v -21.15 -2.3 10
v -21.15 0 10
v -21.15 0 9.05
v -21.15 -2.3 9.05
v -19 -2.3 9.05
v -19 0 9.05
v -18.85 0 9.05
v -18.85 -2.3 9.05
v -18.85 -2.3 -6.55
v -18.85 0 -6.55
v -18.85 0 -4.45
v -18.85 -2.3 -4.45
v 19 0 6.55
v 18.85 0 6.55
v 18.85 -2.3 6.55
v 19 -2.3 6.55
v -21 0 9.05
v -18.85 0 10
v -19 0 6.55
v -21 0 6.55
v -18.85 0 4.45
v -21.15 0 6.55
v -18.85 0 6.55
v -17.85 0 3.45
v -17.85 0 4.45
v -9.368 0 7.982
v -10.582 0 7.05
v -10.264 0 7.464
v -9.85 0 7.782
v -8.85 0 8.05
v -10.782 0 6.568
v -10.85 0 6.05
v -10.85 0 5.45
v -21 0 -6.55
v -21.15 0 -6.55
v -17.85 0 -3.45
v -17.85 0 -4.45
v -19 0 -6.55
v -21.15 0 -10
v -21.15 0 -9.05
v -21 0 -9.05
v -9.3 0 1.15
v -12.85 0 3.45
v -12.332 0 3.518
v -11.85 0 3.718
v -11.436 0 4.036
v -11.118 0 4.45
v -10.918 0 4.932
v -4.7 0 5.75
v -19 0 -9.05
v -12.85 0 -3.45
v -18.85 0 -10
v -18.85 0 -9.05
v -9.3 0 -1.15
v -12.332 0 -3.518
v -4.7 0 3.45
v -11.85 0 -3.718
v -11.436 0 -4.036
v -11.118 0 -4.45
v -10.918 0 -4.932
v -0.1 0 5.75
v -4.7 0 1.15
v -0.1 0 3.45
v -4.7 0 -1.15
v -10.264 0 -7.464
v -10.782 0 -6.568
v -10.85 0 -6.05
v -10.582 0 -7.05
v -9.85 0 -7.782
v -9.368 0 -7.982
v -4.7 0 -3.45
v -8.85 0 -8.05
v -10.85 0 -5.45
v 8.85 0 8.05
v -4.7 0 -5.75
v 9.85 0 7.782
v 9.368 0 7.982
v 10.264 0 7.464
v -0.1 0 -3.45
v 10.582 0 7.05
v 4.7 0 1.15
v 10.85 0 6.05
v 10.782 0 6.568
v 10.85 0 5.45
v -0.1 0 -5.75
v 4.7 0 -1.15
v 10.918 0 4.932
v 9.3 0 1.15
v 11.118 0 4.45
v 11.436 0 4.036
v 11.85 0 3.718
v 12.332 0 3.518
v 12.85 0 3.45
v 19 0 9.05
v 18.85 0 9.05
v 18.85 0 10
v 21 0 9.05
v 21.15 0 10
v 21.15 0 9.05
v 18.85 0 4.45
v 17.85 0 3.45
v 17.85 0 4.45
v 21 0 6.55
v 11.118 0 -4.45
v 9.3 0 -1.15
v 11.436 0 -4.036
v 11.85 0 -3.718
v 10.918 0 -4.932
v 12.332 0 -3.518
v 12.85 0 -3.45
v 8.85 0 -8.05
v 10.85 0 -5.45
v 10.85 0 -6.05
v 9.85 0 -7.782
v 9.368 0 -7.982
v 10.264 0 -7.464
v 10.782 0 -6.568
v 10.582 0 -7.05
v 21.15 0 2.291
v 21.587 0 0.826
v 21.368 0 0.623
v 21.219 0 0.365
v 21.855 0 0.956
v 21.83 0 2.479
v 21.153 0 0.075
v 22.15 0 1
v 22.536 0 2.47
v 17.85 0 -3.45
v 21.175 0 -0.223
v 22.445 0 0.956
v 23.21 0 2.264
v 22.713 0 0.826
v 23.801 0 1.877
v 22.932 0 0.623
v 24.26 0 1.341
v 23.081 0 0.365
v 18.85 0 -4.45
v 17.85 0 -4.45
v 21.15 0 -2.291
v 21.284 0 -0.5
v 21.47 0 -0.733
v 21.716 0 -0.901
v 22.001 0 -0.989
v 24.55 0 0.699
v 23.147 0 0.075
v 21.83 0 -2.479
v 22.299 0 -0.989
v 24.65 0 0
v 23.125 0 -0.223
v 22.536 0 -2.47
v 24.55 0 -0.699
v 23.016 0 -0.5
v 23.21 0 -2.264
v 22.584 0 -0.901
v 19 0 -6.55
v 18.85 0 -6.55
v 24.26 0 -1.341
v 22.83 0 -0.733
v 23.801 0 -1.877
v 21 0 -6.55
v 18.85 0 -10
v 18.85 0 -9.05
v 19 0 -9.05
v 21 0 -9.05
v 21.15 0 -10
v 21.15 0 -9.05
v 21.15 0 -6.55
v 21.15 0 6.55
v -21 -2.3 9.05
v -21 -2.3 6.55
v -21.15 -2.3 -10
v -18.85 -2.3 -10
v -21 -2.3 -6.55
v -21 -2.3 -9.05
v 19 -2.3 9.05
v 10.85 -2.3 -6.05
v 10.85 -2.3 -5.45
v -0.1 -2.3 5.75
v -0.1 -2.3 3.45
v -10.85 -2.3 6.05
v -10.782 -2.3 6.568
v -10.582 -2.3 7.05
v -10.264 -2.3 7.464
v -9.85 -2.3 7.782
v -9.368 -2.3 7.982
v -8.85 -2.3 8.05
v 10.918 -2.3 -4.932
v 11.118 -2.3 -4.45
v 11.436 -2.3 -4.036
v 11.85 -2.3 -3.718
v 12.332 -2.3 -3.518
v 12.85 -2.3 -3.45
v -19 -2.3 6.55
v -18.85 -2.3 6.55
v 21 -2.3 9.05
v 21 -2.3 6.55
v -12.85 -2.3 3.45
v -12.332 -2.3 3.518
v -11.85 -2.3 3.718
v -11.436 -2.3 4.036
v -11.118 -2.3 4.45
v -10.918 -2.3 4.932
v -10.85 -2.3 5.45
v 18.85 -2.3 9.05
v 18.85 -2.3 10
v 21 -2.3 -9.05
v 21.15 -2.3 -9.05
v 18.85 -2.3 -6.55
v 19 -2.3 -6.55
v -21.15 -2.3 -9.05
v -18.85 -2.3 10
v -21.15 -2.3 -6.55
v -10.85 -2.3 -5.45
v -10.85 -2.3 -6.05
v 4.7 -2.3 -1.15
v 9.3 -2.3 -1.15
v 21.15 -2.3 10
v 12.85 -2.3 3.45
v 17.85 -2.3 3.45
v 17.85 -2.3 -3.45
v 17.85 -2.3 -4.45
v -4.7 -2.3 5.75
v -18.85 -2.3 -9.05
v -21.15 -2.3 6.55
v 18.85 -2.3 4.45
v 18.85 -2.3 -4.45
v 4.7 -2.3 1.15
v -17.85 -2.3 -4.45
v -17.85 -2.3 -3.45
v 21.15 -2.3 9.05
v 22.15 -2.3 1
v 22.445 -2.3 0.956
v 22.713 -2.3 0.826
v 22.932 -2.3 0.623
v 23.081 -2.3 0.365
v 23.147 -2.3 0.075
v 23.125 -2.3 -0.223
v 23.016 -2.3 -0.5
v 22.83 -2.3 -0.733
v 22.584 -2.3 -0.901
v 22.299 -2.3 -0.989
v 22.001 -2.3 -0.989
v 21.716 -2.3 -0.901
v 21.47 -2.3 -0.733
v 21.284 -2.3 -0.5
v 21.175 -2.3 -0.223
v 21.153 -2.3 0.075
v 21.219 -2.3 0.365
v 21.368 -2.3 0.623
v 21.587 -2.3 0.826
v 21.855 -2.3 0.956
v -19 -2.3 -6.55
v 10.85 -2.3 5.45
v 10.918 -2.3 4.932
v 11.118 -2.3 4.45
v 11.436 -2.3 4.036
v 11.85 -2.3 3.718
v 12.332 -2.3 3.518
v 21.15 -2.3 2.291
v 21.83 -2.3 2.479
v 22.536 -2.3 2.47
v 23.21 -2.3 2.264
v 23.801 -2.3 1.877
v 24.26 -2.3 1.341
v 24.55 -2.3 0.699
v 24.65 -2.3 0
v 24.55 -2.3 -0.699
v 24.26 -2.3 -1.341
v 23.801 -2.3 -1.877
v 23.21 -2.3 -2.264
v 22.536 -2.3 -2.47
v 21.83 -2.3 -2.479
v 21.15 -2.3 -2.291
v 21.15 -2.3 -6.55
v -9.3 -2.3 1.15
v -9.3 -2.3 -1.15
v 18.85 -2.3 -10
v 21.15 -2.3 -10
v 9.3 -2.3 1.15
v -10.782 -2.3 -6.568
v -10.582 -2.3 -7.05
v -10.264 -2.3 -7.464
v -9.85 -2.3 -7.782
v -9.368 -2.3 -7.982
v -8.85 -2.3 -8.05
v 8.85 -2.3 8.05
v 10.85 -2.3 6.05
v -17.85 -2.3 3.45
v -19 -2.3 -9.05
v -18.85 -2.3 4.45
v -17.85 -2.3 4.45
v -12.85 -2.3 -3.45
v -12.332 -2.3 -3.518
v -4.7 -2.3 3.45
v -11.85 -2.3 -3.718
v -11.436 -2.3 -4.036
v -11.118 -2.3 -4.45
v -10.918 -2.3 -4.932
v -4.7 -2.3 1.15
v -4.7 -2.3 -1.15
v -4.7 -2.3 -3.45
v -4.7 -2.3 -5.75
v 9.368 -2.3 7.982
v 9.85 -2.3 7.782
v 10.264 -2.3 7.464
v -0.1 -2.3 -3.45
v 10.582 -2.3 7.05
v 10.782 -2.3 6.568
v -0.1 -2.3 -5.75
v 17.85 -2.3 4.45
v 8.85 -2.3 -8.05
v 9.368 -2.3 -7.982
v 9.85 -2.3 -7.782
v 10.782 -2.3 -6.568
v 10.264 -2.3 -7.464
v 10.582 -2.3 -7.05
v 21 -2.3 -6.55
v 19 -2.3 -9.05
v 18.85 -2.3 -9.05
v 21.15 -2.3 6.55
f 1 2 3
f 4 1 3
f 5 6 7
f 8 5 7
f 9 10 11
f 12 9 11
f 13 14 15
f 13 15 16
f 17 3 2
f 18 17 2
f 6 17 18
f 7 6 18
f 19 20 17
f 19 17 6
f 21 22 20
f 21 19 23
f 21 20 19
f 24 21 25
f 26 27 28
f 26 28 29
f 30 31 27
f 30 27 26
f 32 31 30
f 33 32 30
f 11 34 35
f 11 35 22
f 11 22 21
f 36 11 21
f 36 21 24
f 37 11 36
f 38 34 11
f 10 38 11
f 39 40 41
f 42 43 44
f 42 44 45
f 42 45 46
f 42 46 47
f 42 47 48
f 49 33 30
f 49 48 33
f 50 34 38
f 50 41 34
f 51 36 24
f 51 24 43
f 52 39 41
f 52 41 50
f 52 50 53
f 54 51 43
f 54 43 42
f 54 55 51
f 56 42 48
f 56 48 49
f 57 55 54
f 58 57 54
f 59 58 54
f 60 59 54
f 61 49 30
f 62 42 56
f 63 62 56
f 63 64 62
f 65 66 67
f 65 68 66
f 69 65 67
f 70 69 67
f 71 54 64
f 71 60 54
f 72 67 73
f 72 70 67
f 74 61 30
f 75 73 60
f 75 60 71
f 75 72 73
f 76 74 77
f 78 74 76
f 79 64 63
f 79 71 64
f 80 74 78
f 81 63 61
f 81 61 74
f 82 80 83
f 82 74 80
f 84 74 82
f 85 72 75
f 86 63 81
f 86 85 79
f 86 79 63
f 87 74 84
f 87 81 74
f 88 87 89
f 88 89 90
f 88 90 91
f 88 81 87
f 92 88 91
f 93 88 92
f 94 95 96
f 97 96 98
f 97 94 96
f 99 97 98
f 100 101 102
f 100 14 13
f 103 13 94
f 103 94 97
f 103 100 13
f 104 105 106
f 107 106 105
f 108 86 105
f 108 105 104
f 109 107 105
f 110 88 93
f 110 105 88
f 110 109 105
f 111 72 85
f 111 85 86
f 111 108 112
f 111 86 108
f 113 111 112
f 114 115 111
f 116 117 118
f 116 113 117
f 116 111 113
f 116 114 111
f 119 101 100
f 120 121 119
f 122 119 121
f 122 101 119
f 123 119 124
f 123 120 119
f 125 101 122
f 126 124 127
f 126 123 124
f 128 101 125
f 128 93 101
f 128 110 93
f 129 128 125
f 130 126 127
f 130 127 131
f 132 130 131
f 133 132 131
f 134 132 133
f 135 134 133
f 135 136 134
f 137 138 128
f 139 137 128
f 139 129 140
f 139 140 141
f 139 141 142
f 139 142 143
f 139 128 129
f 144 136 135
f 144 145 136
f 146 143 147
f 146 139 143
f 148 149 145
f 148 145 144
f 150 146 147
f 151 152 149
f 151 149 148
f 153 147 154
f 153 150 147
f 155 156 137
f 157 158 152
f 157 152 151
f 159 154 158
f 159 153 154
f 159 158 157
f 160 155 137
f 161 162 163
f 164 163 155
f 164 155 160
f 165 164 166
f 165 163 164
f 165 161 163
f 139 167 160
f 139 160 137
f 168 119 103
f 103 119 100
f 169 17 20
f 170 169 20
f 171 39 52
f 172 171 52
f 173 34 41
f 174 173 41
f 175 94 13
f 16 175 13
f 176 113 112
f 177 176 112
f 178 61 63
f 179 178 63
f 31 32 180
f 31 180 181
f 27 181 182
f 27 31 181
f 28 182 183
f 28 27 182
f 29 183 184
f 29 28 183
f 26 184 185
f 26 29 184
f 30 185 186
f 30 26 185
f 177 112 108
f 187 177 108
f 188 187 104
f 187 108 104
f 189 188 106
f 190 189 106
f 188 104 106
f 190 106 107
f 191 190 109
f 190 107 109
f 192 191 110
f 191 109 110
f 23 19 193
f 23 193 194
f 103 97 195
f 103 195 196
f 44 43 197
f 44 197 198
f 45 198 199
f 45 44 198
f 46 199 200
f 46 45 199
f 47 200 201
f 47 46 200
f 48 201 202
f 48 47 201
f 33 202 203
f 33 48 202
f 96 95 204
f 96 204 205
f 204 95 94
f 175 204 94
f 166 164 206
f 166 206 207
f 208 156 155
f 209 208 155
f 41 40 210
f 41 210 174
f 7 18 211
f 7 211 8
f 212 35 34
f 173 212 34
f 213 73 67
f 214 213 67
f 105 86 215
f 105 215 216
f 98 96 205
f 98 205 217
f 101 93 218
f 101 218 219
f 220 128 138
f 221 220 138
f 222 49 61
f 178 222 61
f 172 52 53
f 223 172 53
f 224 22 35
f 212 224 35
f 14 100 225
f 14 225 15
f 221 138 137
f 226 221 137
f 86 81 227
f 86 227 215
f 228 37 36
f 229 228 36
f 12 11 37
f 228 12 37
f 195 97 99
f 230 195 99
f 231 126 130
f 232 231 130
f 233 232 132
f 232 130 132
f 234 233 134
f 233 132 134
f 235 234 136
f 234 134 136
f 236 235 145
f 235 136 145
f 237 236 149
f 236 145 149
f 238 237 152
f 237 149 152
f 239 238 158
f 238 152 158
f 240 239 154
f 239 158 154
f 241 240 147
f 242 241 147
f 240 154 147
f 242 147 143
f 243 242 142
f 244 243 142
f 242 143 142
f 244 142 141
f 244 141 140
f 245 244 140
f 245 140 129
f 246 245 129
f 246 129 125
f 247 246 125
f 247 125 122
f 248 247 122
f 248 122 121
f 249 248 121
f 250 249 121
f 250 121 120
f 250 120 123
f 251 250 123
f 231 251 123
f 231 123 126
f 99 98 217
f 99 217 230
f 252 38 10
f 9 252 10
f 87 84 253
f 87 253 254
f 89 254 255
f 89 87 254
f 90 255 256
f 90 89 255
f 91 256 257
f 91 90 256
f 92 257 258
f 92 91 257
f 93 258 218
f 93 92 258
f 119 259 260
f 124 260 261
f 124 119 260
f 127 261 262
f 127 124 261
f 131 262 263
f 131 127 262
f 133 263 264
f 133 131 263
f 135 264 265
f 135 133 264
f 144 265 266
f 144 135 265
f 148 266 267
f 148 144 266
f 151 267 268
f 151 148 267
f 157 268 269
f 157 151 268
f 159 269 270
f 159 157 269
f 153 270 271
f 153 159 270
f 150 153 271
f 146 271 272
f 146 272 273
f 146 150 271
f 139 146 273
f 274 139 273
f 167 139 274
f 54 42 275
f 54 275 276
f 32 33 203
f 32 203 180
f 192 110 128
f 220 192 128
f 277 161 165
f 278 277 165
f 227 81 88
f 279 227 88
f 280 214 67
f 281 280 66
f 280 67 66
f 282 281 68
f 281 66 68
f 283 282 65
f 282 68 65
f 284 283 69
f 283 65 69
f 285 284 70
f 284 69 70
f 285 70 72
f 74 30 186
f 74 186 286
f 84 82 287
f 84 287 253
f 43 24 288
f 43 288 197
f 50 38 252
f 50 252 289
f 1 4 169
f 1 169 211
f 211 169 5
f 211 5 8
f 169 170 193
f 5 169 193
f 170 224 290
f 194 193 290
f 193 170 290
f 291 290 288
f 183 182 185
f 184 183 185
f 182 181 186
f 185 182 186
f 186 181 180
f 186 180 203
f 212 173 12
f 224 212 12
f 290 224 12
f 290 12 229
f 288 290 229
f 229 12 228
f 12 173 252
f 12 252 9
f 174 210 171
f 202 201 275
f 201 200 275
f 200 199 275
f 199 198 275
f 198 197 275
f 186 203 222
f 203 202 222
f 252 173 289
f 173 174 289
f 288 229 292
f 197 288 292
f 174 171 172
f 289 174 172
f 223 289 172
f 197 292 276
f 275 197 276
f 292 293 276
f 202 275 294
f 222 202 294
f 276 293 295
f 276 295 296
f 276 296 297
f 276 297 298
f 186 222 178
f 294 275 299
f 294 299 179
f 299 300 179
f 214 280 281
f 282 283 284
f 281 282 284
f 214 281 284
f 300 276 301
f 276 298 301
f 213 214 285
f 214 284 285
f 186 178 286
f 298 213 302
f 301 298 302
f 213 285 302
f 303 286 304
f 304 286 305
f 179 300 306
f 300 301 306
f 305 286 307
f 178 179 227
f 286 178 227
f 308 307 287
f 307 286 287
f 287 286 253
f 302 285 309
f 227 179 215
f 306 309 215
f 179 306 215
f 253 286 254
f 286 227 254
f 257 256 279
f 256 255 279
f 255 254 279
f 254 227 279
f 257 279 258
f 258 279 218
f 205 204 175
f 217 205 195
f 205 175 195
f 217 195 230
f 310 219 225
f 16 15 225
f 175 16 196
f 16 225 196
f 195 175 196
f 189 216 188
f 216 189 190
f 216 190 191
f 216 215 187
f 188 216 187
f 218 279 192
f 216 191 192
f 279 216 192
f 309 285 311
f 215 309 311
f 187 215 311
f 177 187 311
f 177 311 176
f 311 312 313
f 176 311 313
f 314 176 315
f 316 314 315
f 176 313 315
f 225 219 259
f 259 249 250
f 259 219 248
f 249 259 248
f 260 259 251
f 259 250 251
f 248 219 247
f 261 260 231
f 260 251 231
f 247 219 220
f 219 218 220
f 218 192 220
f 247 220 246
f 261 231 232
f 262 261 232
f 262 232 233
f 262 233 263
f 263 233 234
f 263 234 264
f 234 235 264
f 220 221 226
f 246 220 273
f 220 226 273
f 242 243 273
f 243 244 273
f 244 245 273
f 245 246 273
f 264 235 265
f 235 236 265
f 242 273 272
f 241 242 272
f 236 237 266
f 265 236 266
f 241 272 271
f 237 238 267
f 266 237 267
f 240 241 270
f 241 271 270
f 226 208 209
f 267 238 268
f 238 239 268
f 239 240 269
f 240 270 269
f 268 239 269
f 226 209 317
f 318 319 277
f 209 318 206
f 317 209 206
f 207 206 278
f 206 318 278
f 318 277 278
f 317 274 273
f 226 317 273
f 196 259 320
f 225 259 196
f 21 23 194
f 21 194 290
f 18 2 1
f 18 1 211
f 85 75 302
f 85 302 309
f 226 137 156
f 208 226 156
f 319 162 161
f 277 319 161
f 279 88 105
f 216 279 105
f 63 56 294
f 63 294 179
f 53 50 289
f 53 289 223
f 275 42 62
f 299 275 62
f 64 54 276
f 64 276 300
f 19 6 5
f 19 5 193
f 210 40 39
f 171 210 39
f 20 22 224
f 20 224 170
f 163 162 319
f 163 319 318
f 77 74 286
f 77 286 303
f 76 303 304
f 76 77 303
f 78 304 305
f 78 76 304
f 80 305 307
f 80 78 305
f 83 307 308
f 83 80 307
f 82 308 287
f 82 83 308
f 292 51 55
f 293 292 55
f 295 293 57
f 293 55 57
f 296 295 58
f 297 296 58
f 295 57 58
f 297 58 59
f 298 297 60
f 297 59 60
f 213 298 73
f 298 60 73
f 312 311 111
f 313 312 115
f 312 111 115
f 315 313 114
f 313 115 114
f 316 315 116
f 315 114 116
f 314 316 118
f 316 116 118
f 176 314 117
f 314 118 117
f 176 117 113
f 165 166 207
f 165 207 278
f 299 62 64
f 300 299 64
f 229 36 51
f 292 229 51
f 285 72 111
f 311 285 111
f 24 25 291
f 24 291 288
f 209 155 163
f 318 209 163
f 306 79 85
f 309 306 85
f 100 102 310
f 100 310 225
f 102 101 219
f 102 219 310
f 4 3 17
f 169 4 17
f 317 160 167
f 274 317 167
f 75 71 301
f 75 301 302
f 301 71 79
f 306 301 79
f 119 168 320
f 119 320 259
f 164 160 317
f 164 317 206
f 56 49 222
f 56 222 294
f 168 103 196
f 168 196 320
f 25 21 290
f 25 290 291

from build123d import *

# Parameters (mm, degrees)
SKETCH1_W          = 42.3
SKETCH1_H          = 20
SKETCH1_W_2        = 4.6
SKETCH1_H_2        = 2.3
BASE_FLANGE1_DEPTH = 2.3
CUT_EXTRUDE1_REACH = 25.508
CUT_EXTRUDE2_REACH = 25.508
SKETCH7_W          = 0.15
SKETCH7_H          = 2.5
SKETCH8_R          = 2.5
SKETCH8_R_2        = 1
TAB1_DEPTH         = 2.3


# Sheet-metal steps are written as plain solids
with BuildPart() as part:
    # Sketch1 → Base-Flange1 (new body)
    with BuildSketch(Plane(origin=(0, 0, 0), x_dir=(1, 0, 0), z_dir=(0, 1, 0))):
        Rectangle(SKETCH1_W, SKETCH1_H)
        with Locations((-7, 0)):
            Rectangle(SKETCH1_W_2, SKETCH1_H_2, mode=Mode.SUBTRACT)
        with Locations((-2.4, -4.6)):
            Rectangle(SKETCH1_W_2, SKETCH1_H_2, mode=Mode.SUBTRACT)
        with Locations((7, 0)):
            Rectangle(SKETCH1_W_2, SKETCH1_H_2, mode=Mode.SUBTRACT)
        with Locations((-2.4, 4.6)):
            Rectangle(SKETCH1_W_2, SKETCH1_H_2, mode=Mode.SUBTRACT)
    extrude(amount=-BASE_FLANGE1_DEPTH)

    # Sketch6 → Cut-Extrude1 (cut, up to next)
    with BuildSketch(Plane(origin=(0, 0, 0), x_dir=(1, 0, 0), z_dir=(0, 1, 0)), mode=Mode.PRIVATE) as cut_extrude1_sk1:
        with BuildLine():
            Line((-18.85, 10), (-18.85, 4.45))
            Line((-18.85, 4.45), (-17.85, 4.45))
            Line((-17.85, 4.45), (-17.85, 3.45))
            Line((-17.85, 3.45), (-12.85, 3.45))
            ThreePointArc((-12.85, 3.45), (-11.435786438, 4.035786438), (-10.85, 5.45))
            Line((-10.85, 5.45), (-10.85, 6.05))
            ThreePointArc((-10.85, 6.05), (-10.264213562, 7.464213562), (-8.85, 8.05))
            Line((-8.85, 8.05), (8.85, 8.05))
            ThreePointArc((8.85, 8.05), (10.264213562, 7.464213562), (10.85, 6.05))
            Line((10.85, 6.05), (10.85, 5.45))
            ThreePointArc((10.85, 5.45), (11.435786438, 4.035786438), (12.85, 3.45))
            Line((12.85, 3.45), (17.85, 3.45))
            Line((17.85, 3.45), (17.85, 4.45))
            Line((17.85, 4.45), (18.85, 4.45))
            Line((18.85, 4.45), (18.85, 10))
            Line((18.85, 10), (-18.85, 10))
        make_face()
    cut_extrude1_tool1 = extrude(cut_extrude1_sk1.sketch, amount=-CUT_EXTRUDE1_REACH, mode=Mode.PRIVATE) & part.part
    # Sketch6 → Cut-Extrude1 (cut, up to next)
    with BuildSketch(Plane(origin=(0, 0, 0), x_dir=(1, 0, 0), z_dir=(0, 1, 0)), mode=Mode.PRIVATE) as cut_extrude1_sk2:
        with BuildLine():
            Line((18.85, -10), (-18.85, -10))
            Line((-18.85, -10), (-18.85, -4.45))
            Line((-18.85, -4.45), (-17.85, -4.45))
            Line((-17.85, -4.45), (-17.85, -3.45))
            Line((-17.85, -3.45), (-12.85, -3.45))
            ThreePointArc((-12.85, -3.45), (-11.435786438, -4.035786438), (-10.85, -5.45))
            Line((-10.85, -5.45), (-10.85, -6.05))
            ThreePointArc((-10.85, -6.05), (-10.264213562, -7.464213562), (-8.85, -8.05))
            Line((-8.85, -8.05), (8.85, -8.05))
            ThreePointArc((8.85, -8.05), (10.264213562, -7.464213562), (10.85, -6.05))
            Line((10.85, -6.05), (10.85, -5.45))
            ThreePointArc((10.85, -5.45), (11.435786438, -4.035786438), (12.85, -3.45))
            Line((12.85, -3.45), (17.85, -3.45))
            Line((17.85, -3.45), (17.85, -4.45))
            Line((17.85, -4.45), (18.85, -4.45))
            Line((18.85, -4.45), (18.85, -10))
        make_face()
    cut_extrude1_tool2 = extrude(cut_extrude1_sk2.sketch, amount=-CUT_EXTRUDE1_REACH, mode=Mode.PRIVATE) & part.part
    add(cut_extrude1_tool1.solids().sort_by_distance((15.35, 0, -3.832648))[0], mode=Mode.SUBTRACT)
    add(cut_extrude1_tool2.solids().sort_by_distance((15.35, 0, 3.832648))[0], mode=Mode.SUBTRACT)

    # Sketch7 → Cut-Extrude2 (cut, up to next)
    with BuildSketch(Plane(origin=(0, 0, 0), x_dir=(1, 0, 0), z_dir=(0, 1, 0)), mode=Mode.PRIVATE) as cut_extrude2_sk1:
        with Locations((-21.075, 7.8)):
            Rectangle(SKETCH7_W, SKETCH7_H)
    cut_extrude2_tool1 = extrude(cut_extrude2_sk1.sketch, amount=-CUT_EXTRUDE2_REACH, mode=Mode.PRIVATE) & part.part
    # Sketch7 → Cut-Extrude2 (cut, up to next)
    with BuildSketch(Plane(origin=(0, 0, 0), x_dir=(1, 0, 0), z_dir=(0, 1, 0)), mode=Mode.PRIVATE) as cut_extrude2_sk2:
        with Locations((-18.925, 7.8)):
            Rectangle(SKETCH7_W, SKETCH7_H)
    cut_extrude2_tool2 = extrude(cut_extrude2_sk2.sketch, amount=-CUT_EXTRUDE2_REACH, mode=Mode.PRIVATE) & part.part
    # Sketch7 → Cut-Extrude2 (cut, up to next)
    with BuildSketch(Plane(origin=(0, 0, 0), x_dir=(1, 0, 0), z_dir=(0, 1, 0)), mode=Mode.PRIVATE) as cut_extrude2_sk3:
        with Locations((-21.075, -7.8)):
            Rectangle(SKETCH7_W, SKETCH7_H)
    cut_extrude2_tool3 = extrude(cut_extrude2_sk3.sketch, amount=-CUT_EXTRUDE2_REACH, mode=Mode.PRIVATE) & part.part
    # Sketch7 → Cut-Extrude2 (cut, up to next)
    with BuildSketch(Plane(origin=(0, 0, 0), x_dir=(1, 0, 0), z_dir=(0, 1, 0)), mode=Mode.PRIVATE) as cut_extrude2_sk4:
        with Locations((-18.925, -7.8)):
            Rectangle(SKETCH7_W, SKETCH7_H)
    cut_extrude2_tool4 = extrude(cut_extrude2_sk4.sketch, amount=-CUT_EXTRUDE2_REACH, mode=Mode.PRIVATE) & part.part
    # Sketch7 → Cut-Extrude2 (cut, up to next)
    with BuildSketch(Plane(origin=(0, 0, 0), x_dir=(1, 0, 0), z_dir=(0, 1, 0)), mode=Mode.PRIVATE) as cut_extrude2_sk5:
        with Locations((21.075, -7.8)):
            Rectangle(SKETCH7_W, SKETCH7_H)
    cut_extrude2_tool5 = extrude(cut_extrude2_sk5.sketch, amount=-CUT_EXTRUDE2_REACH, mode=Mode.PRIVATE) & part.part
    # Sketch7 → Cut-Extrude2 (cut, up to next)
    with BuildSketch(Plane(origin=(0, 0, 0), x_dir=(1, 0, 0), z_dir=(0, 1, 0)), mode=Mode.PRIVATE) as cut_extrude2_sk6:
        with Locations((18.925, -7.8)):
            Rectangle(SKETCH7_W, SKETCH7_H)
    cut_extrude2_tool6 = extrude(cut_extrude2_sk6.sketch, amount=-CUT_EXTRUDE2_REACH, mode=Mode.PRIVATE) & part.part
    # Sketch7 → Cut-Extrude2 (cut, up to next)
    with BuildSketch(Plane(origin=(0, 0, 0), x_dir=(1, 0, 0), z_dir=(0, 1, 0)), mode=Mode.PRIVATE) as cut_extrude2_sk7:
        with Locations((21.075, 7.8)):
            Rectangle(SKETCH7_W, SKETCH7_H)
    cut_extrude2_tool7 = extrude(cut_extrude2_sk7.sketch, amount=-CUT_EXTRUDE2_REACH, mode=Mode.PRIVATE) & part.part
    # Sketch7 → Cut-Extrude2 (cut, up to next)
    with BuildSketch(Plane(origin=(0, 0, 0), x_dir=(1, 0, 0), z_dir=(0, 1, 0)), mode=Mode.PRIVATE) as cut_extrude2_sk8:
        with Locations((18.925, 7.8)):
            Rectangle(SKETCH7_W, SKETCH7_H)
    cut_extrude2_tool8 = extrude(cut_extrude2_sk8.sketch, amount=-CUT_EXTRUDE2_REACH, mode=Mode.PRIVATE) & part.part
    add(cut_extrude2_tool1.solids().sort_by_distance((-21.075, 0, -7.8))[0], mode=Mode.SUBTRACT)
    add(cut_extrude2_tool2.solids().sort_by_distance((-18.925, 0, -7.8))[0], mode=Mode.SUBTRACT)
    add(cut_extrude2_tool3.solids().sort_by_distance((-21.075, 0, 7.8))[0], mode=Mode.SUBTRACT)
    add(cut_extrude2_tool4.solids().sort_by_distance((-18.925, 0, 7.8))[0], mode=Mode.SUBTRACT)
    add(cut_extrude2_tool5.solids().sort_by_distance((21.075, 0, 7.8))[0], mode=Mode.SUBTRACT)
    add(cut_extrude2_tool6.solids().sort_by_distance((18.925, 0, 7.8))[0], mode=Mode.SUBTRACT)
    add(cut_extrude2_tool7.solids().sort_by_distance((21.075, 0, -7.8))[0], mode=Mode.SUBTRACT)
    add(cut_extrude2_tool8.solids().sort_by_distance((18.925, 0, -7.8))[0], mode=Mode.SUBTRACT)

    # Sketch8 → Tab1 (add)
    with BuildSketch(Plane(origin=(0, 0, 0), x_dir=(1, 0, 0), z_dir=(0, 1, 0))):
        with Locations((22.15, 0)):
            Circle(SKETCH8_R)
        with Locations(Location((22.15, 0, 0), (0, 0, 270))):
            Circle(SKETCH8_R_2, mode=Mode.SUBTRACT)
    extrude(amount=-TAB1_DEPTH)


solid = part.part
